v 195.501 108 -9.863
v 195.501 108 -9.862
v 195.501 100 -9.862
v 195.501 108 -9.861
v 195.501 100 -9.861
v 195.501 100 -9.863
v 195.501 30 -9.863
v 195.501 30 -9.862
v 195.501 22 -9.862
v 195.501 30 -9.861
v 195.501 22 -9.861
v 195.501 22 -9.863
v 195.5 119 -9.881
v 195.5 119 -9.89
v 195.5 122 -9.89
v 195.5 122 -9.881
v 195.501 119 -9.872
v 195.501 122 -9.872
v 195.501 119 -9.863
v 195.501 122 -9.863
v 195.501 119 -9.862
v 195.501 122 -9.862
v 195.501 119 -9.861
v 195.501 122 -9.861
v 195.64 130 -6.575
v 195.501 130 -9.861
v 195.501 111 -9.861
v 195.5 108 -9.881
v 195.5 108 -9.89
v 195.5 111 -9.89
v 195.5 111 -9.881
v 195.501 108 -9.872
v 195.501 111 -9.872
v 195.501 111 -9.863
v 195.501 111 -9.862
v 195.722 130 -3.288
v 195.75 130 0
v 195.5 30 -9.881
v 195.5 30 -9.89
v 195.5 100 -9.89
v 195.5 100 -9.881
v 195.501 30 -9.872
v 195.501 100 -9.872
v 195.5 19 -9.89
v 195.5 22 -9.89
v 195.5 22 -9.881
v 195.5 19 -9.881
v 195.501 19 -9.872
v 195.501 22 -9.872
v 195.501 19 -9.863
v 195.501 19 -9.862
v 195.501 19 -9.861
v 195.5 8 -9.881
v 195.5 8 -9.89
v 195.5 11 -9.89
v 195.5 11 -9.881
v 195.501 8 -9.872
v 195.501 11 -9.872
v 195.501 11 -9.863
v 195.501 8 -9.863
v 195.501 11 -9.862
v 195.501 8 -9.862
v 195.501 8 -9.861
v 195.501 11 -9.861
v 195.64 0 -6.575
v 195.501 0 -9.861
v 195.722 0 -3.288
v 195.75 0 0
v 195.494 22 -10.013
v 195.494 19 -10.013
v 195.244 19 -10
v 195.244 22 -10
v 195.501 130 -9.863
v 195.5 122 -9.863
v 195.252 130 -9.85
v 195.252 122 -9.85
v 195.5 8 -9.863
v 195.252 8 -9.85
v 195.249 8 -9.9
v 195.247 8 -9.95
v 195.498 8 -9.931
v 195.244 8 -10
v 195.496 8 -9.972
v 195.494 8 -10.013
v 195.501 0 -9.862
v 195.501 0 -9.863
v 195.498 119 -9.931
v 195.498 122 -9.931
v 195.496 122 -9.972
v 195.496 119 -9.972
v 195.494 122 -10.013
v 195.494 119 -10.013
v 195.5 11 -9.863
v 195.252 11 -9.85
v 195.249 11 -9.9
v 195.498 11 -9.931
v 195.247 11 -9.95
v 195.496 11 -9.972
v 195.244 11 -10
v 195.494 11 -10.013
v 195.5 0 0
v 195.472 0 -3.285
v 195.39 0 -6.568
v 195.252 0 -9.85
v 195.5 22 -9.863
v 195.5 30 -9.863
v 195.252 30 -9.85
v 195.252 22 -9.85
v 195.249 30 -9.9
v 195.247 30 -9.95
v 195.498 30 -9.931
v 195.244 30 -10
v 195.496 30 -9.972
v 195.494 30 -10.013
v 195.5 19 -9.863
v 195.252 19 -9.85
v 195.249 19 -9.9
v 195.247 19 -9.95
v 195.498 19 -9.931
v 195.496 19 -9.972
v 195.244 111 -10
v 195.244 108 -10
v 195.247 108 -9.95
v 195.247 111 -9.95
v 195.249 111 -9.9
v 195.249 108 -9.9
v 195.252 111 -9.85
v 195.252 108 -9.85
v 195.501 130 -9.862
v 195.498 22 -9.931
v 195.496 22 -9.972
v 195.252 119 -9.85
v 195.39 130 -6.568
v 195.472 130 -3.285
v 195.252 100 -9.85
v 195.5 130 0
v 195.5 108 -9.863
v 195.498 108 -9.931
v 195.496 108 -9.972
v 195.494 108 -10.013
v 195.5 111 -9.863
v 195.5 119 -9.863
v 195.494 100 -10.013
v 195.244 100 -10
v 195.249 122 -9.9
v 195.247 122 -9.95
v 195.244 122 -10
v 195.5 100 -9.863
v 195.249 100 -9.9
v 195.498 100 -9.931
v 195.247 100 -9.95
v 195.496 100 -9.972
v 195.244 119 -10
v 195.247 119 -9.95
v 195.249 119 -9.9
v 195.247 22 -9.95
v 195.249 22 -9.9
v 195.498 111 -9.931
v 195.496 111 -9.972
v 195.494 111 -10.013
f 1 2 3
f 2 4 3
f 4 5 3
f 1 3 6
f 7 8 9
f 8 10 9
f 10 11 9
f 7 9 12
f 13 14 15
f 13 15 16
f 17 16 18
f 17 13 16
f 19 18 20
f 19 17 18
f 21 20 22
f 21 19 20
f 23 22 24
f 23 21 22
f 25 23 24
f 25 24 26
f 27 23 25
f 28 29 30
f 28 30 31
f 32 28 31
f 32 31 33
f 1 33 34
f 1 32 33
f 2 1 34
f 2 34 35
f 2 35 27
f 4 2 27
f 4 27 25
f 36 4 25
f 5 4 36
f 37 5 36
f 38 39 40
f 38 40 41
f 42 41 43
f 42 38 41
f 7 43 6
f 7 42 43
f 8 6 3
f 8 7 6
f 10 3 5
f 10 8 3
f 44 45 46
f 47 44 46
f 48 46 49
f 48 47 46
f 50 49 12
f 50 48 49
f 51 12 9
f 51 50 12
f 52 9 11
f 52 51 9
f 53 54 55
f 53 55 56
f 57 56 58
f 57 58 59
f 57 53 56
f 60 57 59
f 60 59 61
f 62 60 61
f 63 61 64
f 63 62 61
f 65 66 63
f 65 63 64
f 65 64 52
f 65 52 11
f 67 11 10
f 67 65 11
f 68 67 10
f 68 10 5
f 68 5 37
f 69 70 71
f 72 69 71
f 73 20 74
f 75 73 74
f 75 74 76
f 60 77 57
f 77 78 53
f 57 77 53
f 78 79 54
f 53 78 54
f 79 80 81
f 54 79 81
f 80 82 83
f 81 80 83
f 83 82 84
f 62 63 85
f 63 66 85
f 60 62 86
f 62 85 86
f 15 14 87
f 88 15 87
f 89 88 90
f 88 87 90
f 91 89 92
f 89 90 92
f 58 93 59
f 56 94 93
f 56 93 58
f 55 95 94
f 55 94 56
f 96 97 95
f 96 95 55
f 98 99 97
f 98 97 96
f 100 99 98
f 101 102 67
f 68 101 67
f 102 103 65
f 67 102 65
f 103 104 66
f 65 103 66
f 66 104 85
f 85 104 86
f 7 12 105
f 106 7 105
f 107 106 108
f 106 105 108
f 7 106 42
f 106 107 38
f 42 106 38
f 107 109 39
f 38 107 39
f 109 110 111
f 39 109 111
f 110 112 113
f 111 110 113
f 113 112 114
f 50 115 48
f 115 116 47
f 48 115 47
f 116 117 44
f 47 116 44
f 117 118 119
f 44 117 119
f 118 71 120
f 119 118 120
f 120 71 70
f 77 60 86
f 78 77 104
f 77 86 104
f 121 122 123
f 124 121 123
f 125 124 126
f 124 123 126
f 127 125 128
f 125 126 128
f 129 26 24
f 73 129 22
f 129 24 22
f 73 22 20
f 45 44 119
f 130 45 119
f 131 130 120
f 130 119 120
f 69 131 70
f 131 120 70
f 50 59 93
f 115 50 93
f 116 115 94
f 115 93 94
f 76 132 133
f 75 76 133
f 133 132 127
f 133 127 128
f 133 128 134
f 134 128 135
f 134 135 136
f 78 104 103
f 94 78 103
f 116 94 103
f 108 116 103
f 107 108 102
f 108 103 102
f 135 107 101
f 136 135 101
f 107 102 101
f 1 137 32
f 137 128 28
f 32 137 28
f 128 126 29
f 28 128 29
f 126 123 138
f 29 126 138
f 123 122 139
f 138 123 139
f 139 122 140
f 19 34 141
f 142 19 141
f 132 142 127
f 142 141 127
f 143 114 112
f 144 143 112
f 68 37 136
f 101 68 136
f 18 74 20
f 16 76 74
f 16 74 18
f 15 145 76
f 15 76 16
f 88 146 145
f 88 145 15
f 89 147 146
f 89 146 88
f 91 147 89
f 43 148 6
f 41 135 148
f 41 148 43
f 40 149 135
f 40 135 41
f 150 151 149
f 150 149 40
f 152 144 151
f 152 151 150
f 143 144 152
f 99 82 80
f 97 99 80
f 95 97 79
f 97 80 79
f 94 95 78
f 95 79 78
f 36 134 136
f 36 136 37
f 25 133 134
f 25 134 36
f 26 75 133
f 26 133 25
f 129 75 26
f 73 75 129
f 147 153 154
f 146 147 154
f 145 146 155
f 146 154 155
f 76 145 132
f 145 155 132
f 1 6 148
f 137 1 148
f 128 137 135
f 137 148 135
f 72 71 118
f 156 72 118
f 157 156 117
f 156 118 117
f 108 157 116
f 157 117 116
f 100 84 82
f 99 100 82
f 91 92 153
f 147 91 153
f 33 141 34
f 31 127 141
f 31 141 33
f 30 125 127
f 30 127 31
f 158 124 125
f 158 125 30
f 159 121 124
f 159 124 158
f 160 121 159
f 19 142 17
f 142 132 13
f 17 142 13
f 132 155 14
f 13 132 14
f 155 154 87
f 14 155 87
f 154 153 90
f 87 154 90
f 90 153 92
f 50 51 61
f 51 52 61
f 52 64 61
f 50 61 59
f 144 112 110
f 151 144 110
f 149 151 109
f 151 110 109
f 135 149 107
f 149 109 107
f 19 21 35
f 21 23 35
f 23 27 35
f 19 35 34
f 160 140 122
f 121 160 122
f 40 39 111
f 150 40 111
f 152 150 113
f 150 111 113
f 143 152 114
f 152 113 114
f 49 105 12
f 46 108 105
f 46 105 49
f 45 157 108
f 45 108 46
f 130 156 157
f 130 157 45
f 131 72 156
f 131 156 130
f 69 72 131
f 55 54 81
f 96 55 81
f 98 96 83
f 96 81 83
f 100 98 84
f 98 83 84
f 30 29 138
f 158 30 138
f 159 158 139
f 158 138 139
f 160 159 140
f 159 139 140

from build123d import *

# Parameters (mm, degrees)
BASE_FLANGE1_DEPTH        = 130
UNFOLD1_DEPTH             = 130
UNFOLD1_2_DEPTH           = 130
SKETCH6_W                 = 0.3
SKETCH6_H                 = 8
CUT_EXTRUDE1_DEPTH        = 235.985371885
LPATTERN1_COUNT           = 3
LPATTERN1_PITCH           = 11
LPATTERN2_COUNT           = 3
LPATTERN2_PITCH           = 100
LPATTERN2_COPY_1_SKETCH_W = 0.3
LPATTERN2_COPY_1_SKETCH_H = 8
LPATTERN2_COPY_1_DEPTH    = 235.985371885
LPATTERN2_COPY_2_SKETCH_W = 0.3
LPATTERN2_COPY_2_SKETCH_H = 8
LPATTERN2_COPY_2_DEPTH    = 235.985371885
LPATTERN2_COPY_3_SKETCH_W = 0.3
LPATTERN2_COPY_3_SKETCH_H = 8
LPATTERN2_COPY_3_DEPTH    = 235.985371885
LPATTERN2_COPY_4_SKETCH_W = 0.3
LPATTERN2_COPY_4_SKETCH_H = 8
LPATTERN2_COPY_4_DEPTH    = 235.985371885
FOLD1_DEPTH               = 130
FOLD1_2_DEPTH             = 130
FOLD1_START               = 30
FOLD1_3_DEPTH             = 70
FOLD1_START_2             = 8
FOLD1_4_DEPTH             = 3
FOLD1_START_3             = 19
FOLD1_5_DEPTH             = 3
FOLD1_START_4             = 108
FOLD1_6_DEPTH             = 3
FOLD1_START_5             = 119
FOLD1_7_DEPTH             = 3


# Read off the part's stored shape, not the designer's step: Unfold1, Fold1
# Sheet-metal steps are written as plain solids
with BuildPart() as part:
    # Sketch1 → Base-Flange1 (new body)
    with BuildSketch(Plane(origin=(0, 0, 0), x_dir=(1, 0, 0), z_dir=(0, 1, 0))):
        with BuildLine():
            ThreePointArc((195.5, 0), (195.436009031, 5.001637134), (195.244078015, 10))
            Line((195.244078015, 10), (195.493750749, 10.012787724))
            ThreePointArc((195.493750749, 10.012787724), (195.685927201, 5.008033089), (195.75, 0))
            Line((195.75, 0), (195.5, 0))
        make_face()
    extrude(amount=BASE_FLANGE1_DEPTH)

    # Unfold1 outline → Unfold1 (cut)
    with BuildSketch(Plane(origin=(0, 0, 0), x_dir=(1, 0, 0), z_dir=(0, 1, 0))):
        with BuildLine():
            Line((195.5, 0), (195.5, 9.890020218))
            ThreePointArc((195.5, 9.890020218), (195.496885011, 9.951404462), (195.493750749, 10.012787724))
            Line((195.493750749, 10.012787724), (195.244078015, 10))
            ThreePointArc((195.244078015, 10), (195.436009031, 5.001637134), (195.5, 0))
        make_face()
    extrude(amount=UNFOLD1_DEPTH, mode=Mode.SUBTRACT)

    # Unfold1 2 outline → Unfold1 2 (add)
    with BuildSketch(Plane(origin=(0, 0, 0), x_dir=(1, 0, 0), z_dir=(0, 1, 0))):
        with BuildLine():
            Line((195.75, 0), (195.75, 10.010762486))
            Line((195.75, 10.010762486), (195.5, 10.010762486))
            Line((195.5, 10.010762486), (195.5, 9.890020218))
            ThreePointArc((195.5, 9.890020218), (195.687490019, 4.946589732), (195.75, 0))
        make_face()
    extrude(amount=UNFOLD1_2_DEPTH)

    # Sketch6 → Cut-Extrude1 (cut, symmetric)
    with BuildSketch(Plane(origin=(195.75, 0, -195.75), x_dir=(0, 0, 1), z_dir=(-1, 0, 0))):
        with Locations((185.739237514, 126)):
            Rectangle(SKETCH6_W, SKETCH6_H)
    cut_extrude1 = extrude(amount=CUT_EXTRUDE1_DEPTH, both=True, mode=Mode.SUBTRACT)

    # LPattern1: Cut-Extrude1 ×3
    with Locations(*[(0, -i * LPATTERN1_PITCH, 0) for i in range(1, LPATTERN1_COUNT)]):
        add(cut_extrude1, mode=Mode.SUBTRACT)

    # LPattern2: Cut-Extrude1 ×3
    with Locations(*[(0, -i * LPATTERN2_PITCH, 0) for i in range(1, LPATTERN2_COUNT)]):
        add(cut_extrude1, mode=Mode.SUBTRACT)

    # LPattern2 copy 1 sketch → LPattern2 copy 1 (cut, symmetric)
    with BuildSketch(Plane(origin=(195.75, -111, -195.75), x_dir=(0, 0, 1), z_dir=(-1, 0, 0))):
        with Locations((185.739237514, 126)):
            Rectangle(LPATTERN2_COPY_1_SKETCH_W, LPATTERN2_COPY_1_SKETCH_H)
    extrude(amount=LPATTERN2_COPY_1_DEPTH, both=True, mode=Mode.SUBTRACT)

    # LPattern2 copy 2 sketch → LPattern2 copy 2 (cut, symmetric)
    with BuildSketch(Plane(origin=(195.75, -211, -195.75), x_dir=(0, 0, 1), z_dir=(-1, 0, 0))):
        with Locations((185.739237514, 126)):
            Rectangle(LPATTERN2_COPY_2_SKETCH_W, LPATTERN2_COPY_2_SKETCH_H)
    extrude(amount=LPATTERN2_COPY_2_DEPTH, both=True, mode=Mode.SUBTRACT)

    # LPattern2 copy 3 sketch → LPattern2 copy 3 (cut, symmetric)
    with BuildSketch(Plane(origin=(195.75, -122, -195.75), x_dir=(0, 0, 1), z_dir=(-1, 0, 0))):
        with Locations((185.739237514, 126)):
            Rectangle(LPATTERN2_COPY_3_SKETCH_W, LPATTERN2_COPY_3_SKETCH_H)
    extrude(amount=LPATTERN2_COPY_3_DEPTH, both=True, mode=Mode.SUBTRACT)

    # LPattern2 copy 4 sketch → LPattern2 copy 4 (cut, symmetric)
    with BuildSketch(Plane(origin=(195.75, -222, -195.75), x_dir=(0, 0, 1), z_dir=(-1, 0, 0))):
        with Locations((185.739237514, 126)):
            Rectangle(LPATTERN2_COPY_4_SKETCH_W, LPATTERN2_COPY_4_SKETCH_H)
    extrude(amount=LPATTERN2_COPY_4_DEPTH, both=True, mode=Mode.SUBTRACT)

    # Fold1 outline → Fold1 (cut)
    with BuildSketch(Plane(origin=(0, 0, 0), x_dir=(1, 0, 0), z_dir=(0, 1, 0))):
        with BuildLine():
            ThreePointArc((195.5, 9.890020218), (195.687490019, 4.946589732), (195.75, 0))
            Line((195.75, 0), (195.75, 10.010762486))
            Line((195.75, 10.010762486), (195.5, 10.010762486))
            Line((195.5, 10.010762486), (195.5, 9.890020218))
        make_face()
    extrude(amount=FOLD1_DEPTH, mode=Mode.SUBTRACT)

    # Fold1 2 outline → Fold1 2 (add)
    with BuildSketch(Plane(origin=(0, 0, 0), x_dir=(1, 0, 0), z_dir=(0, 1, 0))):
        with BuildLine():
            ThreePointArc((195.25168835, 9.850289156), (195.437912228, 4.926709225), (195.5, 0))
            Line((195.5, 0), (195.5, 9.860762486))
            Line((195.5, 9.860762486), (195.501477905, 9.860762486))
            ThreePointArc((195.501477905, 9.860762486), (195.501424363, 9.86182396), (195.501370816, 9.862885433))
            Line((195.501370816, 9.862885433), (195.25168835, 9.850289156))
        make_face()
    extrude(amount=FOLD1_2_DEPTH)

    # Fold1 3 outline → Fold1 3 (add)
    with BuildSketch(Plane(origin=(0, 0, 0), x_dir=(1, 0, 0), z_dir=(0, 1, 0)).offset(FOLD1_START)):
        with BuildLine():
            ThreePointArc((195.244078015, 10), (195.247897532, 9.925145307), (195.25168835, 9.850289156))
            Line((195.25168835, 9.850289156), (195.5, 9.862816276))
            Line((195.5, 9.862816276), (195.5, 9.890020218))
            ThreePointArc((195.5, 9.890020218), (195.496885011, 9.951404462), (195.493750749, 10.012787724))
            Line((195.493750749, 10.012787724), (195.244078015, 10))
        make_face()
    extrude(amount=FOLD1_3_DEPTH)

    # Fold1 4 outline → Fold1 4 (add)
    with BuildSketch(Plane(origin=(0, 0, 0), x_dir=(1, 0, 0), z_dir=(0, 1, 0)).offset(FOLD1_START_2)):
        with BuildLine():
            ThreePointArc((195.244078015, 10), (195.247897532, 9.925145307), (195.25168835, 9.850289156))
            Line((195.25168835, 9.850289156), (195.5, 9.862816276))
            Line((195.5, 9.862816276), (195.5, 9.890020218))
            ThreePointArc((195.5, 9.890020218), (195.496885011, 9.951404462), (195.493750749, 10.012787724))
            Line((195.493750749, 10.012787724), (195.244078015, 10))
        make_face()
    extrude(amount=FOLD1_4_DEPTH)

    # Fold1 5 outline → Fold1 5 (add)
    with BuildSketch(Plane(origin=(0, 0, 0), x_dir=(1, 0, 0), z_dir=(0, 1, 0)).offset(FOLD1_START_3)):
        with BuildLine():
            ThreePointArc((195.244078015, 10), (195.247897532, 9.925145307), (195.25168835, 9.850289156))
            Line((195.25168835, 9.850289156), (195.5, 9.862816276))
            Line((195.5, 9.862816276), (195.5, 9.890020218))
            ThreePointArc((195.5, 9.890020218), (195.496885011, 9.951404462), (195.493750749, 10.012787724))
            Line((195.493750749, 10.012787724), (195.244078015, 10))
        make_face()
    extrude(amount=FOLD1_5_DEPTH)

    # Fold1 6 outline → Fold1 6 (add)
    with BuildSketch(Plane(origin=(0, 0, 0), x_dir=(1, 0, 0), z_dir=(0, 1, 0)).offset(FOLD1_START_4)):
        with BuildLine():
            ThreePointArc((195.244078015, 10), (195.247897532, 9.925145307), (195.25168835, 9.850289156))
            Line((195.25168835, 9.850289156), (195.5, 9.862816276))
            Line((195.5, 9.862816276), (195.5, 9.890020218))
            ThreePointArc((195.5, 9.890020218), (195.496885011, 9.951404462), (195.493750749, 10.012787724))
            Line((195.493750749, 10.012787724), (195.244078015, 10))
        make_face()
    extrude(amount=FOLD1_6_DEPTH)

    # Fold1 7 outline → Fold1 7 (add)
    with BuildSketch(Plane(origin=(0, 0, 0), x_dir=(1, 0, 0), z_dir=(0, 1, 0)).offset(FOLD1_START_5)):
        with BuildLine():
            ThreePointArc((195.244078015, 10), (195.247897532, 9.925145307), (195.25168835, 9.850289156))
            Line((195.25168835, 9.850289156), (195.5, 9.862816276))
            Line((195.5, 9.862816276), (195.5, 9.890020218))
            ThreePointArc((195.5, 9.890020218), (195.496885011, 9.951404462), (195.493750749, 10.012787724))
            Line((195.493750749, 10.012787724), (195.244078015, 10))
        make_face()
    extrude(amount=FOLD1_7_DEPTH)


solid = part.part
